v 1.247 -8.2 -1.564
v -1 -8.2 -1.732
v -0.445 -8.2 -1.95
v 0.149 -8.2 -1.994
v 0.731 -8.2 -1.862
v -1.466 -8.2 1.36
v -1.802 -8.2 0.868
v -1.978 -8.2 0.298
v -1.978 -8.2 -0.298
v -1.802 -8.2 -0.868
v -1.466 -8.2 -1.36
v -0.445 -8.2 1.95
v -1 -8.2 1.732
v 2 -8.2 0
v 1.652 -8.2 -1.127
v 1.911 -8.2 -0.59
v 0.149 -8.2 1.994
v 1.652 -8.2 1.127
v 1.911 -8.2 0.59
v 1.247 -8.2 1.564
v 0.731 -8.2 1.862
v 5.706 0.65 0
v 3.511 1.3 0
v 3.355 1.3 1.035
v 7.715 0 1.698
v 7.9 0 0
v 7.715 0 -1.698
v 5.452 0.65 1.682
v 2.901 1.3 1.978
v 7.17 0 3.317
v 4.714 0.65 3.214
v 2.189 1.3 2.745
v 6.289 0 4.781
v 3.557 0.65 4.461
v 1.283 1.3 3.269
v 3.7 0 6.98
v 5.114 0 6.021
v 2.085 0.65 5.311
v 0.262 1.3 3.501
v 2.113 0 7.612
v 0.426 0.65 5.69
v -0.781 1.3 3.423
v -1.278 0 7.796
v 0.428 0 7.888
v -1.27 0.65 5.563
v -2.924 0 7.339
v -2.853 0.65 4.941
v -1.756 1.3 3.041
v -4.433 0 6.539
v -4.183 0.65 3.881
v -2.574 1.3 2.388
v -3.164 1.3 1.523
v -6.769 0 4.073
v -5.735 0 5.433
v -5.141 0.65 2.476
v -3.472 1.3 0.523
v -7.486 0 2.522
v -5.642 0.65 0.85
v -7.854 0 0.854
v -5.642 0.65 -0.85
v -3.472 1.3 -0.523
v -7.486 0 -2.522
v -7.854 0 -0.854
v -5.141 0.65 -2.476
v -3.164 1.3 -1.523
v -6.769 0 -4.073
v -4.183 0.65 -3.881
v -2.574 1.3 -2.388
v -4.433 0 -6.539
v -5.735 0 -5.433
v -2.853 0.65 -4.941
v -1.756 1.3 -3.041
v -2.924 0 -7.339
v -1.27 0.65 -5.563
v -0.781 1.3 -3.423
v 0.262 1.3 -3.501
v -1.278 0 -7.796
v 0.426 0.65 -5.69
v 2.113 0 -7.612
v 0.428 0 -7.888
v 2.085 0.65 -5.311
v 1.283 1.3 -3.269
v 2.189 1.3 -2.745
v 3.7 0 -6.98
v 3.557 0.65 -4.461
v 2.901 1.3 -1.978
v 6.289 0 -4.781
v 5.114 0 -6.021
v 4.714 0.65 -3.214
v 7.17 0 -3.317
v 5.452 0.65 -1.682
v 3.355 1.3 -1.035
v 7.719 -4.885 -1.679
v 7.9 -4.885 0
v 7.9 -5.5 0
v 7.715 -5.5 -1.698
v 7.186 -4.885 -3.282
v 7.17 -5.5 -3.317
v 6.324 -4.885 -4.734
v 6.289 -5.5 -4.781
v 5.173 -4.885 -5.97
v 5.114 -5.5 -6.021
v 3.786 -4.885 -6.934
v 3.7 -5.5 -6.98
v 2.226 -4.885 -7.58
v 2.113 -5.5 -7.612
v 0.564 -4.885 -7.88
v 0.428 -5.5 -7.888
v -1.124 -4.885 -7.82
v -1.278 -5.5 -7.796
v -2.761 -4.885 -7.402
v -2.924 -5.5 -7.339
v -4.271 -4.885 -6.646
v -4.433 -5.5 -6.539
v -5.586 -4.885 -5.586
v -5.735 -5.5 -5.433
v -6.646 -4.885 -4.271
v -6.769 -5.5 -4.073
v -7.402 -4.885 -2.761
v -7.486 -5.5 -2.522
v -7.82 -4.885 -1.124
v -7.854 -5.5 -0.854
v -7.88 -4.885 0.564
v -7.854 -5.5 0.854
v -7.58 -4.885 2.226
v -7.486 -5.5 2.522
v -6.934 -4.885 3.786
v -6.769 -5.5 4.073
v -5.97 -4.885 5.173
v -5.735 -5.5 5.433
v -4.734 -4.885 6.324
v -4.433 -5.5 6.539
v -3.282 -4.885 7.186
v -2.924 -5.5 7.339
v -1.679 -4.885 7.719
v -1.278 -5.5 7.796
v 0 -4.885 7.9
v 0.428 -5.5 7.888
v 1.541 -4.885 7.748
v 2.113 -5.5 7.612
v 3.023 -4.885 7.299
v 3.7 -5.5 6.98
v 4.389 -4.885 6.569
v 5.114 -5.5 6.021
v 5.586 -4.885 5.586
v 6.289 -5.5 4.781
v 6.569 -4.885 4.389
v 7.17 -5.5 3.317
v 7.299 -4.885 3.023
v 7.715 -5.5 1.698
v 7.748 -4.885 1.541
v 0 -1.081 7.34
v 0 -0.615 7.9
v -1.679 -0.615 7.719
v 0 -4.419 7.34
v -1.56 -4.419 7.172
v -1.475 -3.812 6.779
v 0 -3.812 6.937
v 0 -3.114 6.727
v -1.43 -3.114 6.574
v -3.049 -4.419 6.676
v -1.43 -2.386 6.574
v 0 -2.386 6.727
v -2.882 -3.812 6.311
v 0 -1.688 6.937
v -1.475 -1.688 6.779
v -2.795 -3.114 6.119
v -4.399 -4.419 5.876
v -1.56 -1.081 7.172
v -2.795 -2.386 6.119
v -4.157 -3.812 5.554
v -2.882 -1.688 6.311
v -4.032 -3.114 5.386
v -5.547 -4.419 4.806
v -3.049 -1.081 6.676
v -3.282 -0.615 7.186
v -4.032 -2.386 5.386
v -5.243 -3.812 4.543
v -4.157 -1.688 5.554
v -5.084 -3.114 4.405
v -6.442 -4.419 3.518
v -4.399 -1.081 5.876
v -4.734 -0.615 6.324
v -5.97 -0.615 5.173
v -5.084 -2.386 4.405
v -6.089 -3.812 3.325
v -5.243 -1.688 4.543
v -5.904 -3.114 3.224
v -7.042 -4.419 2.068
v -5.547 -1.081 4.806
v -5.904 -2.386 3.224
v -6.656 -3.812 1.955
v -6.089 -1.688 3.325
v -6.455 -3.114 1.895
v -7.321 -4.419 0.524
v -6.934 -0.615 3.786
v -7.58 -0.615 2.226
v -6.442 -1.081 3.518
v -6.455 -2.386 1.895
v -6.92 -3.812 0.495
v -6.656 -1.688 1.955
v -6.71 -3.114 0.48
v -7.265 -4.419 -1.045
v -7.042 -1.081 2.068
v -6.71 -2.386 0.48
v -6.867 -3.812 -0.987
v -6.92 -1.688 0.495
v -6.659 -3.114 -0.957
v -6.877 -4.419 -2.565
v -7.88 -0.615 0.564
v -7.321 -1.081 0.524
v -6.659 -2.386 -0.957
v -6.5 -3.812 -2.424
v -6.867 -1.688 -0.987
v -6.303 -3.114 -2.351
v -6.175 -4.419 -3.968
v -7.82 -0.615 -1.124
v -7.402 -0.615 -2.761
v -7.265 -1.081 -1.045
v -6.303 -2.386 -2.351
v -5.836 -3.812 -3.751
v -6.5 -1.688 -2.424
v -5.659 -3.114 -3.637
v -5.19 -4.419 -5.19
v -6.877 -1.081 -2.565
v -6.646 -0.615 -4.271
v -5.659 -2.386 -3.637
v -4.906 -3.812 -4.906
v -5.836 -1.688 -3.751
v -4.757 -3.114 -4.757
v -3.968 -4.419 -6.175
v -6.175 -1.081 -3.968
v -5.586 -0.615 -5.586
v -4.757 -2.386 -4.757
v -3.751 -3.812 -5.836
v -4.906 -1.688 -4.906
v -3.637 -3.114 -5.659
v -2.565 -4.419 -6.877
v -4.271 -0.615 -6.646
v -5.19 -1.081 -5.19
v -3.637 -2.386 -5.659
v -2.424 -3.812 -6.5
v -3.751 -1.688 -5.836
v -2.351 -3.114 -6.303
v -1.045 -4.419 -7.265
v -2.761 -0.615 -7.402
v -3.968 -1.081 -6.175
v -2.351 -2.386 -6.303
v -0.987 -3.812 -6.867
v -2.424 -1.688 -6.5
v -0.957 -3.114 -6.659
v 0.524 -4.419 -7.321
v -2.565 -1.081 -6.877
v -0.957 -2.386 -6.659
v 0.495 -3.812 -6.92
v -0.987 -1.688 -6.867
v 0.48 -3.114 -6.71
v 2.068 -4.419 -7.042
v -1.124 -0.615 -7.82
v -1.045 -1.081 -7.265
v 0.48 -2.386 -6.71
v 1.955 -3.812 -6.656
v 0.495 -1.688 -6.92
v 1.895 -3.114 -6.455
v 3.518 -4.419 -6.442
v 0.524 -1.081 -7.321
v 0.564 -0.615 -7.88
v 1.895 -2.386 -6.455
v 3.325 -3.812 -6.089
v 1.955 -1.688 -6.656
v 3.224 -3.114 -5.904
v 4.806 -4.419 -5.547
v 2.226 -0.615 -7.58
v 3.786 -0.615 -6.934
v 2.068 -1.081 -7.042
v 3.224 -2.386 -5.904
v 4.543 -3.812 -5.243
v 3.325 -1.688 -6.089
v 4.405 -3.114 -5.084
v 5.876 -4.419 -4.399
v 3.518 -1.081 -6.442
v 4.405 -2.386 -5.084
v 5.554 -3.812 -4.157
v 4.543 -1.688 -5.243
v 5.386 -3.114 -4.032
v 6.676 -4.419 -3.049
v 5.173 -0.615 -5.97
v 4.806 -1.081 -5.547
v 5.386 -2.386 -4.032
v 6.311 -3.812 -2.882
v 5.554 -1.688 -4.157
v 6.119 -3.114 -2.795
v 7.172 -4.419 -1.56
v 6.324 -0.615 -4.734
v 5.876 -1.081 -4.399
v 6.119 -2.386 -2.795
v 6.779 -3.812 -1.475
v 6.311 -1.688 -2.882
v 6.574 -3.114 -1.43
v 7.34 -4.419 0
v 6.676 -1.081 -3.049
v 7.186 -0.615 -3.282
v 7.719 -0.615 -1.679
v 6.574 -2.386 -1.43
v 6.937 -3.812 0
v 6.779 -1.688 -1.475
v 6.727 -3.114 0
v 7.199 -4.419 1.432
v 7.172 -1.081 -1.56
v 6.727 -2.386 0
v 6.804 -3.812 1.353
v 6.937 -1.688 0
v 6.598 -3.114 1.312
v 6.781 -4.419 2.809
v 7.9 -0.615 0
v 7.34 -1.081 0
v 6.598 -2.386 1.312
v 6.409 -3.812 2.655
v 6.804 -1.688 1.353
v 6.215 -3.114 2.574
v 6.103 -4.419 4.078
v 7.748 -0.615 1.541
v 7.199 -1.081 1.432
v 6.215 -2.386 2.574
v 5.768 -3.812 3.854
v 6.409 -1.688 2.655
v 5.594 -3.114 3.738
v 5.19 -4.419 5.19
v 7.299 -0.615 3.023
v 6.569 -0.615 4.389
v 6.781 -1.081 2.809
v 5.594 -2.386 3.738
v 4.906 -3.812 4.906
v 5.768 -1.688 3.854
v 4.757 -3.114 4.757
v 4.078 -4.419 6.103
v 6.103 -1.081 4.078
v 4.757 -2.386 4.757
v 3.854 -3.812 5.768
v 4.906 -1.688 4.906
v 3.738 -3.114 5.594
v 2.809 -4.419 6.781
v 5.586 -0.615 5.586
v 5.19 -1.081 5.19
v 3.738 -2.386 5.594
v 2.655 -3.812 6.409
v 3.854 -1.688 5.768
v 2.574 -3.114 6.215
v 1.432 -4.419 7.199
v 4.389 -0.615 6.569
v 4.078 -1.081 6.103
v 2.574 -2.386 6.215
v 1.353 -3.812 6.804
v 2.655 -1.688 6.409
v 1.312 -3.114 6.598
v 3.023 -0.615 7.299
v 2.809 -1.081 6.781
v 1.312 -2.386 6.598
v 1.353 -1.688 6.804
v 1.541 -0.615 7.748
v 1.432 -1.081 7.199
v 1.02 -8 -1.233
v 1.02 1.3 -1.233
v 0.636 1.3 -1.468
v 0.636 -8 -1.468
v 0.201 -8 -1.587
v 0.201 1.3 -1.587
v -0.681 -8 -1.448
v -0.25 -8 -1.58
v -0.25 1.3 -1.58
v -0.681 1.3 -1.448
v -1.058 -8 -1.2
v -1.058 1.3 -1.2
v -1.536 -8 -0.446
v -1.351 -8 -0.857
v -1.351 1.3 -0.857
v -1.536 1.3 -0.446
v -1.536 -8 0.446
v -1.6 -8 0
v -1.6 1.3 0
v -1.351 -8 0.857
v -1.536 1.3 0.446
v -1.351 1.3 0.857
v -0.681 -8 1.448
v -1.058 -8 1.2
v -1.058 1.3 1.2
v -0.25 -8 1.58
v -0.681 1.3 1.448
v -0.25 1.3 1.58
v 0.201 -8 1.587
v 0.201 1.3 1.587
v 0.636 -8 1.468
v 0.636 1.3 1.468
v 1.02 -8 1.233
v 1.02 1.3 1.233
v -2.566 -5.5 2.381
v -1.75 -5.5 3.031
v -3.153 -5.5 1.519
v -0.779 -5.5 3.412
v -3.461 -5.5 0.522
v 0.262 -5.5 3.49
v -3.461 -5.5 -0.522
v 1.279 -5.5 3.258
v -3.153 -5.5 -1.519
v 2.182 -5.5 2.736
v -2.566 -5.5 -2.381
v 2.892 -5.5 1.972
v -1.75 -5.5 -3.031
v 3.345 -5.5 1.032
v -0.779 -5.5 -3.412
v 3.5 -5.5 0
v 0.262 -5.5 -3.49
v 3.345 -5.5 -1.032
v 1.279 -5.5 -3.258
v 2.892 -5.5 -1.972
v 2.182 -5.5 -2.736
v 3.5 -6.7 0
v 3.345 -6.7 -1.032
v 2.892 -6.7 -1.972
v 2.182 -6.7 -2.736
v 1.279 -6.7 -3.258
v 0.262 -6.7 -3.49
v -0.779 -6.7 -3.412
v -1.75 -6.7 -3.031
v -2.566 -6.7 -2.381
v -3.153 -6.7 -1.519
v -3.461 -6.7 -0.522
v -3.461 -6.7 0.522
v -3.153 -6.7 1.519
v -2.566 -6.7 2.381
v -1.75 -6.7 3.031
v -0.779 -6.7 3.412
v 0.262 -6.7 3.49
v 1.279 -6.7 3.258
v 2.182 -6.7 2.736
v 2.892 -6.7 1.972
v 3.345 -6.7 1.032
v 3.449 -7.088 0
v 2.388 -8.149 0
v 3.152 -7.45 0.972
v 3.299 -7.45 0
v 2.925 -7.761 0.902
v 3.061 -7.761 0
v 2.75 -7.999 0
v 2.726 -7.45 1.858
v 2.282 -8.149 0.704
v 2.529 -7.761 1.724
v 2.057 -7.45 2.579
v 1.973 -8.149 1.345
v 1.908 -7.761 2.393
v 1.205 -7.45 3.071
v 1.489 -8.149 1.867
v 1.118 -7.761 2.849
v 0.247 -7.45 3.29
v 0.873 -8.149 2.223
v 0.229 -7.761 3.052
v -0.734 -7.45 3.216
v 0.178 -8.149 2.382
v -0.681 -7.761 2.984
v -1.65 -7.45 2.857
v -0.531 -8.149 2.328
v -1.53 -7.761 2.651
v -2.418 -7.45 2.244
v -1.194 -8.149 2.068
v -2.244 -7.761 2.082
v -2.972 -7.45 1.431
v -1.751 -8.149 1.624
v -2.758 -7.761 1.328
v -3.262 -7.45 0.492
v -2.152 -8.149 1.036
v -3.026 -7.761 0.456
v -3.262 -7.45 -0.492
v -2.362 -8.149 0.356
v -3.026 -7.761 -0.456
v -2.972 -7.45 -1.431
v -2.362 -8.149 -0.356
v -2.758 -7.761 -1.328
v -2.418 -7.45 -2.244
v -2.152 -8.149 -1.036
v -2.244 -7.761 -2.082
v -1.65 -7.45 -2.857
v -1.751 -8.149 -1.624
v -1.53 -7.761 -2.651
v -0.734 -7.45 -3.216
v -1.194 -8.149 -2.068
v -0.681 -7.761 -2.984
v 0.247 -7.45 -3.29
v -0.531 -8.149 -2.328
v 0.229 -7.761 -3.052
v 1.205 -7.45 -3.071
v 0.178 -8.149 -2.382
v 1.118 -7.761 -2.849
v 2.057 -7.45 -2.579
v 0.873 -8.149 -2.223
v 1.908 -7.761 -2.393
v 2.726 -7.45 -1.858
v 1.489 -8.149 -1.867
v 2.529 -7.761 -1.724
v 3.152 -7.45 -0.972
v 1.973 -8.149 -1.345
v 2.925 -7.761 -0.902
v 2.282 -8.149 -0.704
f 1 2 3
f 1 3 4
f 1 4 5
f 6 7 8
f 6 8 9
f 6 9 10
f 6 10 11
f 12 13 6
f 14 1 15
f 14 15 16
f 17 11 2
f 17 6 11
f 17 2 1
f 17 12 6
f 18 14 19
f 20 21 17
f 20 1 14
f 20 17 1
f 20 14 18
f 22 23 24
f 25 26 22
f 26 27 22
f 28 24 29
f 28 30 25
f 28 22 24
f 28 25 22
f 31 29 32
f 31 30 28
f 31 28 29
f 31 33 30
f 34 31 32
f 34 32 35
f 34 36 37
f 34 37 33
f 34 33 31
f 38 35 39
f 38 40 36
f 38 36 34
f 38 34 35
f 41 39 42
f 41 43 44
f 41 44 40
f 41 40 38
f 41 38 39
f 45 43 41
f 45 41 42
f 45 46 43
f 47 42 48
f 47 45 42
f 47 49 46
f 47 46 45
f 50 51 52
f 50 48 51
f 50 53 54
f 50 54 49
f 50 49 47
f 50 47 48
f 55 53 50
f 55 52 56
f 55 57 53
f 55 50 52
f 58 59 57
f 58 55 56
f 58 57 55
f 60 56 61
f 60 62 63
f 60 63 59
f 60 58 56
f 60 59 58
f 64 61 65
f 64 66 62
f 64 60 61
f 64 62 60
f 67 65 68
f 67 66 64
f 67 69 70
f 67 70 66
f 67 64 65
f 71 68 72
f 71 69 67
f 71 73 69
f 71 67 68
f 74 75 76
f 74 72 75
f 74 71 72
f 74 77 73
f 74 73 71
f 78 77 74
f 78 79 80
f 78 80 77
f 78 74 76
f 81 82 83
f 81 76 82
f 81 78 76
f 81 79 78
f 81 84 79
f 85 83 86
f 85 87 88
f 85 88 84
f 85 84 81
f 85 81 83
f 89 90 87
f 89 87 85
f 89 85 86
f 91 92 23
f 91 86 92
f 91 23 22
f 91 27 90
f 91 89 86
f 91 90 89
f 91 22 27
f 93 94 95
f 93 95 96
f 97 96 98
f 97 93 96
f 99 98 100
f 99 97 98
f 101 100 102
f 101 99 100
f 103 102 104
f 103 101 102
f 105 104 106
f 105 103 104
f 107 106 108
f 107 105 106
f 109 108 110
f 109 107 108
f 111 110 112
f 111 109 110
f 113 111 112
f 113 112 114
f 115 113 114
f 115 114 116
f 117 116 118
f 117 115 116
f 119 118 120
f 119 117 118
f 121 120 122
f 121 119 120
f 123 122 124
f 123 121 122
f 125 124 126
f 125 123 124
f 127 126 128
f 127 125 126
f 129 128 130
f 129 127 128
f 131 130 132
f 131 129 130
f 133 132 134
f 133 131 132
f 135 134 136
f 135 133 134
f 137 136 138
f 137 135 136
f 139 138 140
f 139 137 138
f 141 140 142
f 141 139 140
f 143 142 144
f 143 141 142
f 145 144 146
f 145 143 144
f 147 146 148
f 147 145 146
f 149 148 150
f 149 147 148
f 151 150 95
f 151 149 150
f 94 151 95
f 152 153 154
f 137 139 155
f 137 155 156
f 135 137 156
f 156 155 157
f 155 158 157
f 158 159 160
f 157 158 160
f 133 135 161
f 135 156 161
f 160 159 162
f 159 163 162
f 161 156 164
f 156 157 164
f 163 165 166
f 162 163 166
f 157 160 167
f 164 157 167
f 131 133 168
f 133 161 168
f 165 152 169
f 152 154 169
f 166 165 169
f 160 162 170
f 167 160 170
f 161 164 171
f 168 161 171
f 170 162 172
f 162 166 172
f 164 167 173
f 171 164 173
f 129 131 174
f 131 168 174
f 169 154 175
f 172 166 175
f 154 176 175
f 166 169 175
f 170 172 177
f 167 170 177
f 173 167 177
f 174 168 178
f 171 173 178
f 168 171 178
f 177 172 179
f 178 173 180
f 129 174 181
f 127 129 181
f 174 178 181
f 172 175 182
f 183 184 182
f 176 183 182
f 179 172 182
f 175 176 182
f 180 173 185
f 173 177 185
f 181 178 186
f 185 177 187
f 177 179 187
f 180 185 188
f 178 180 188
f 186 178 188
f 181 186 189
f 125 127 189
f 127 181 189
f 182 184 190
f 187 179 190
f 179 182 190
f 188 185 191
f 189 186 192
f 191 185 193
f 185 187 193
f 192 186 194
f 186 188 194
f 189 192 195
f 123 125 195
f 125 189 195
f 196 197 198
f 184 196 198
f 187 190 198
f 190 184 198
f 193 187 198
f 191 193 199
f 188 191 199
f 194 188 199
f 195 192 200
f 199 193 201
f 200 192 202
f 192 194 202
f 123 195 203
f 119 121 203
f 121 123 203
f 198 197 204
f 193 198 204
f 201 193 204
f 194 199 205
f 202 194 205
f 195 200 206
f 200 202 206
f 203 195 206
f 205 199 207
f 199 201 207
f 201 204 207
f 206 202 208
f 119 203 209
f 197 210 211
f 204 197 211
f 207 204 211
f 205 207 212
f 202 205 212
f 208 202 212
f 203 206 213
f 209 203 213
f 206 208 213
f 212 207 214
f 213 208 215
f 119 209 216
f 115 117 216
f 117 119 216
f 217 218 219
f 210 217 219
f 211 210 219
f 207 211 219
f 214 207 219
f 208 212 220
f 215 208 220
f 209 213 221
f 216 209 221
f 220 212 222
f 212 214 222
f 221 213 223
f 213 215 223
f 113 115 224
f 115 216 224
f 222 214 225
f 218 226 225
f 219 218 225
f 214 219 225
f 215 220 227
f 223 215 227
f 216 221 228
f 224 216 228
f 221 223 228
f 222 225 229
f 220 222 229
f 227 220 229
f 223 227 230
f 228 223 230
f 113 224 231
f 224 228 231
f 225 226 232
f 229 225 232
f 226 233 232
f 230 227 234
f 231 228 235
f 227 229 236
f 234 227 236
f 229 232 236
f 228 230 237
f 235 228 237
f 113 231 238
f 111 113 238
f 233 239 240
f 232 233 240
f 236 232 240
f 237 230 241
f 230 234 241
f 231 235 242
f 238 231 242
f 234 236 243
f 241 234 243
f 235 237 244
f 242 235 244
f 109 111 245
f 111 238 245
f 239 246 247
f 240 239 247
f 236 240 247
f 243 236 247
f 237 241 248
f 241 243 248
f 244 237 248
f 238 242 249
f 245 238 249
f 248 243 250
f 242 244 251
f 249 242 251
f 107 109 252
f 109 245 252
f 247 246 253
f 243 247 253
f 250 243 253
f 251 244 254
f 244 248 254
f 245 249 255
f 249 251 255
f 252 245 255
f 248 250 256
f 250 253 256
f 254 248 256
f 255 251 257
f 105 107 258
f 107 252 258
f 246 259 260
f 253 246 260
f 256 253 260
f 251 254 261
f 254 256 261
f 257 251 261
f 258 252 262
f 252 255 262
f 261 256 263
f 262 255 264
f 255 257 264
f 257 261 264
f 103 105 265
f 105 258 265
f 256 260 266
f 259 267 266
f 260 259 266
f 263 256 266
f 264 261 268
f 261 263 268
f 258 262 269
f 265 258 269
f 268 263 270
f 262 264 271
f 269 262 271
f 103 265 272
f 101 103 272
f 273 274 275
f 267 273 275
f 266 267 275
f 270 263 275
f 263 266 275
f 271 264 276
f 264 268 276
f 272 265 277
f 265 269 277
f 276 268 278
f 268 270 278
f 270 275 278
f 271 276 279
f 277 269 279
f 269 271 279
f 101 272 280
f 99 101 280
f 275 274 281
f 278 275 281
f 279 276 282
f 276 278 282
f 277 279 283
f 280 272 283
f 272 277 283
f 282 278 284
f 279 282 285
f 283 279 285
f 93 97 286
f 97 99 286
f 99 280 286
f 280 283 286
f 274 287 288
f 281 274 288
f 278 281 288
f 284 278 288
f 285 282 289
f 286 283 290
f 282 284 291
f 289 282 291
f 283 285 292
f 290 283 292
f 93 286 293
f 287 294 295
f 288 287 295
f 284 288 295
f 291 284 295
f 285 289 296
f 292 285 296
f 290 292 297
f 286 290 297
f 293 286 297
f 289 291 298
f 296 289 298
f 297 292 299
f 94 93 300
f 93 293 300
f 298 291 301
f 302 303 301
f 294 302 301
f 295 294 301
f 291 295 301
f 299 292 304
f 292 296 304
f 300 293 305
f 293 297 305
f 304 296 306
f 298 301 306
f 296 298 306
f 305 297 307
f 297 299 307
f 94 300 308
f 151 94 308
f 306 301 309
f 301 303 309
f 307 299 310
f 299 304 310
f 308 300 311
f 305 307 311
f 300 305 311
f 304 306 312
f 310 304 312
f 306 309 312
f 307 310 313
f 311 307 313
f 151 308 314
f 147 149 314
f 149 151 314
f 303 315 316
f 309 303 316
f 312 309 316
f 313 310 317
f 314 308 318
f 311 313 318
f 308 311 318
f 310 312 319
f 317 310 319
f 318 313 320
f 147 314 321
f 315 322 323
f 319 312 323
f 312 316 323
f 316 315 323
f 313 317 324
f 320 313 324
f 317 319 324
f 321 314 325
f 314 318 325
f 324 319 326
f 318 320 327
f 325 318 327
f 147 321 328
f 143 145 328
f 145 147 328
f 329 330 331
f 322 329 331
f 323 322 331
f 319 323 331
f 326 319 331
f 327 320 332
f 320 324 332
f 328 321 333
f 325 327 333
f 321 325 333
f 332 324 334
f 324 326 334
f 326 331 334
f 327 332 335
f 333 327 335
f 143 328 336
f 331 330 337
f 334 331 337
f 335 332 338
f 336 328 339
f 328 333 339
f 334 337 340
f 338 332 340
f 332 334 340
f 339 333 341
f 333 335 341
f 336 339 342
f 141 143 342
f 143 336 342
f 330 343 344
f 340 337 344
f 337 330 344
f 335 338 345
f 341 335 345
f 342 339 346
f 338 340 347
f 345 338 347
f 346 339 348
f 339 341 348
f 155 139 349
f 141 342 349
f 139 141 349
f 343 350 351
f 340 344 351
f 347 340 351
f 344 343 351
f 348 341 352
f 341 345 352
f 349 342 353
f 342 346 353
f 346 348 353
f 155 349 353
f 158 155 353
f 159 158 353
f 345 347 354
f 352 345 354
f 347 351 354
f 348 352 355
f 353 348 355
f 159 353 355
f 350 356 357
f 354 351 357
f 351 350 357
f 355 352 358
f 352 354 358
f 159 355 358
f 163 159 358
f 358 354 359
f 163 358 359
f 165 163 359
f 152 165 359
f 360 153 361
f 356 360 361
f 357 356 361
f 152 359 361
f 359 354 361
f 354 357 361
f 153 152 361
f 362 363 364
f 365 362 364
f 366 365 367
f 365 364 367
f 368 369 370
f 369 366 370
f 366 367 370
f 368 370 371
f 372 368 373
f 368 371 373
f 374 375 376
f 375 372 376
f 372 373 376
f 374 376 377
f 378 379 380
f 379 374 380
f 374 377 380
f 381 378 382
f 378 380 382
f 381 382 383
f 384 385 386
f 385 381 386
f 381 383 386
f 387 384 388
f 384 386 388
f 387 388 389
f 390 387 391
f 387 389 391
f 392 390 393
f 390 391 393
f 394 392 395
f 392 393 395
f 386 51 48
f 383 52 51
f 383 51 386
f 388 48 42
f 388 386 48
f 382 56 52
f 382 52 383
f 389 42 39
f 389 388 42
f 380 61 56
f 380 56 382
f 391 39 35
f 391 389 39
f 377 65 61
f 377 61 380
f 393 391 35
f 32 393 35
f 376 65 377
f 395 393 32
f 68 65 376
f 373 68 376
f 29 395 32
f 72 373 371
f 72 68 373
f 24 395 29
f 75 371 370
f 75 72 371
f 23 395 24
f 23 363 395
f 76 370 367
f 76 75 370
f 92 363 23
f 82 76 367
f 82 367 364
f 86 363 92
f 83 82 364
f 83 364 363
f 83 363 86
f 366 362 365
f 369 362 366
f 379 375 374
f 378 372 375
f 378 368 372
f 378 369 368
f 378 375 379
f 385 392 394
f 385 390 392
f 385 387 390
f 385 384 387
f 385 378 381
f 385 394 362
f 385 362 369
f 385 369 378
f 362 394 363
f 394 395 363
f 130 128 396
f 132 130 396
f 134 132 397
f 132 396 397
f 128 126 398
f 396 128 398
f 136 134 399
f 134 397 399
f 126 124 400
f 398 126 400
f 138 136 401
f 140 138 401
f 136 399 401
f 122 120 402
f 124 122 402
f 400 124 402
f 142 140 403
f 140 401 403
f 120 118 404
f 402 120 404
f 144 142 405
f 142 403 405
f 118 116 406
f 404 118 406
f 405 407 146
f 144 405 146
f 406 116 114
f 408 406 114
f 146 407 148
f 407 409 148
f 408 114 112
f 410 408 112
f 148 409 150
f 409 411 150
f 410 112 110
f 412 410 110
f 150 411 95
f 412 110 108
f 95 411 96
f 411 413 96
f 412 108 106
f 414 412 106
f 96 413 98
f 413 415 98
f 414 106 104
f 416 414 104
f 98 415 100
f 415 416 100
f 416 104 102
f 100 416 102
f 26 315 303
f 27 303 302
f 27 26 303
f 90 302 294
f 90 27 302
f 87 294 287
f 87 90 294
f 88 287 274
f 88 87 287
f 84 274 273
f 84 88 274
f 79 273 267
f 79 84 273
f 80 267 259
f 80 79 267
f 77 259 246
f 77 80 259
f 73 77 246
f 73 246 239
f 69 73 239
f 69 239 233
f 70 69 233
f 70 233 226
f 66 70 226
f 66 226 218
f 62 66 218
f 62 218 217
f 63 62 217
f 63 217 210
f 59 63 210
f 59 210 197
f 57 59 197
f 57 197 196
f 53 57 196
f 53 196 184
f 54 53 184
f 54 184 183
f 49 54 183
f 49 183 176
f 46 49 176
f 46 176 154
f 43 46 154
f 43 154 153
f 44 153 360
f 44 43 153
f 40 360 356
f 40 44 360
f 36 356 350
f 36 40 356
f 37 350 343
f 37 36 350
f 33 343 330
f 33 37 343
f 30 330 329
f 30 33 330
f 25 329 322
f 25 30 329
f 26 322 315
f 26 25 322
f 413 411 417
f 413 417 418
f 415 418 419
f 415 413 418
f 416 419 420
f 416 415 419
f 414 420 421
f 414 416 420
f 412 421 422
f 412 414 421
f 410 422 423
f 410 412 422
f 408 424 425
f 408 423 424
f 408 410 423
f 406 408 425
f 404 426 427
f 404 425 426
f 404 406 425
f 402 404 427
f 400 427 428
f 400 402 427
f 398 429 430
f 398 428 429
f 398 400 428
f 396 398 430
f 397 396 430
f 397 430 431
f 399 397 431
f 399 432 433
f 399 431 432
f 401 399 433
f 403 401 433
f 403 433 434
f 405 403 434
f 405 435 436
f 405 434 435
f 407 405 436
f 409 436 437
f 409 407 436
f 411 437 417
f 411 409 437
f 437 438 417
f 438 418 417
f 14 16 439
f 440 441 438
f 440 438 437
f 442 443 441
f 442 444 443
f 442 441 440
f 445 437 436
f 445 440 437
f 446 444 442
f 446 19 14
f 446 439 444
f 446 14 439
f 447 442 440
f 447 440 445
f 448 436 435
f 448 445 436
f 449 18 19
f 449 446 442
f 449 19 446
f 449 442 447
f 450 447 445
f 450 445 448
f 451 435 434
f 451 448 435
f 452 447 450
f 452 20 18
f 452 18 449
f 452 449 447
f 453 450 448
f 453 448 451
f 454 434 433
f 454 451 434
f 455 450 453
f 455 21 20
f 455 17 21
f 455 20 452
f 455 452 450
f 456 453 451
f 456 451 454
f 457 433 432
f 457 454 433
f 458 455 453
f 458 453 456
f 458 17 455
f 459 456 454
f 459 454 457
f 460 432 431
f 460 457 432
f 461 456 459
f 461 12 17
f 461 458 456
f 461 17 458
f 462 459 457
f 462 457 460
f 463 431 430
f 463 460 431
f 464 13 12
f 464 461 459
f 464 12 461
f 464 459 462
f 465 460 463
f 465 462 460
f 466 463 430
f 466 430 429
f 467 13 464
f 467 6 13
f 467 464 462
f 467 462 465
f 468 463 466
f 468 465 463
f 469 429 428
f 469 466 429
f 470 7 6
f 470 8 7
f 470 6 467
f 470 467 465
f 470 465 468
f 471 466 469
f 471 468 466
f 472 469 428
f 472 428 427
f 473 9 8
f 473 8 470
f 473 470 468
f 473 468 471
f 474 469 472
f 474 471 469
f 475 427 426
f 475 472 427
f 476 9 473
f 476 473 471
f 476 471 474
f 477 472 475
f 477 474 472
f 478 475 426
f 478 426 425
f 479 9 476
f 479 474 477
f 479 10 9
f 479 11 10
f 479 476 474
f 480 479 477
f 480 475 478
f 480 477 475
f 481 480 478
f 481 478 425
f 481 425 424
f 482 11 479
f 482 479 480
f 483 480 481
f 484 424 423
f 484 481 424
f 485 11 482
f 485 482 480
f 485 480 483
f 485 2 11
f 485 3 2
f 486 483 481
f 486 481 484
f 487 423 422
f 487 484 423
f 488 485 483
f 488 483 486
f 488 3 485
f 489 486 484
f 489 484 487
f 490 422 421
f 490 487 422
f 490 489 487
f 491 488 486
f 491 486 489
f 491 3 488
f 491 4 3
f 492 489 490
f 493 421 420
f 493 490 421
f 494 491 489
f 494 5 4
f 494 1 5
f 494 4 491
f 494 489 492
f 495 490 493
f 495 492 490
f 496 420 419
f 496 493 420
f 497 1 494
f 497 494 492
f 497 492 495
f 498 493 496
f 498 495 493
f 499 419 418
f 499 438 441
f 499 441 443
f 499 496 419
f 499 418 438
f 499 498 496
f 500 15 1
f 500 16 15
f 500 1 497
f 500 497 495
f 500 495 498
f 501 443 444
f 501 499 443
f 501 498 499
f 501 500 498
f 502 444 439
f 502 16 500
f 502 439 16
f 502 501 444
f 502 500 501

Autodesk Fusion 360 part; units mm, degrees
sketch "Sketch1" plane through (0, 0, 0) normal (0, 1, 0) x (1, 0, 0)
  circle A0 centre (0, 0) radius 7.9
  dimension "d1" = 15.8
extrude "Extrude1" add sketch "Sketch1" against normal blind 5.5
sketch "Sketch2" plane through (0, -5.5, 0) normal (0, -1, 0) x (1, 0, 0)
  circle A0 centre (0, 0) radius 7.9
  circle A1 centre (0, 0) radius 3.5
  dimension "d4" = 7
extrude "Extrude2" add sketch "Sketch2" along normal blind 2.7 contours A1
fillet "Fillet1" radius 1.5 1 edges at (-3.2631, -8.2, -1.2657)
extrude "Extrude3" add 1 faces at (3.1441, 0, -2.759) along direction (0, 1, 0) blind 1.3 draft -73.5
sketch "Sketch3" plane through (0, 1.3, 0) normal (0, 1, 0) x (-1, 0, 0)
  circle A0 centre (0, 0) radius 3.5113
  circle A1 centre (0, 0) radius 1.6
  line L0 (-1.02, 1.2327) -> (-1.02, -1.2327)
  dimension "d11" = 3.2
  dimension "d12" = 1.02
extrude "Extrude4" cut sketch "Sketch3" against normal blind 9.3 contours A1 L0 picked at (-0.3273, 0.4001)
sketch "Sketch4" plane through (0, 0, 0) normal (1, 0, 0) x (0, 1, 0)
  line L0 (1.3, 0) -> (1.3, -3.5113)
  line L1 (1.3, 3.5113) -> (1.3, 0)
  line L2 (-8.2, 0) -> (-8.2, 2)
  line L3 (-8.2, -2) -> (-8.2, 0)
  line L4 (-5.5, -3.5) -> (-5.5, -7.9)
  line L5 (-5.5, 7.9) -> (-5.5, 3.5)
  line L6 (1.3, 3.5113) -> (0, 7.9)
  line L7 (1.3, -3.5113) -> (0, -7.9)
  arc A0 (-8.2, -2) -> (-6.7, -3.5) centre (-6.7, -2) ccw
  arc A1 (-6.7, 3.5) -> (-8.2, 2) centre (-6.7, 2) ccw
  line L8 (-5.5, 3.5) -> (-6.7, 3.5)
  line L9 (-5.5, -3.5) -> (-6.7, -3.5)
  line L10 (0, 7.9) -> (-5.5, 7.9)
  line L11 (0, -7.9) -> (-5.5, -7.9)
  line L12 (-5.5, 7.9) -> (-5.5, -7.9)
  line L13 (0, -7.9) -> (0, 7.9)
  circle A2 centre (-2.75, 9.2007) radius 2.5
  point P0 (-4.885, 7.9)
  point P1 (-0.615, 7.9)
  dimension "d15" = 0.615
  dimension "d16" = 0.615
  dimension "d17" = 5
revolve "Revolve1" cut sketch "Sketch4" angle 360 about axis through (0, 1.75, 0) along (0, 1, 0) contours L10 A2 picked at (-2.75, 7.5002)
